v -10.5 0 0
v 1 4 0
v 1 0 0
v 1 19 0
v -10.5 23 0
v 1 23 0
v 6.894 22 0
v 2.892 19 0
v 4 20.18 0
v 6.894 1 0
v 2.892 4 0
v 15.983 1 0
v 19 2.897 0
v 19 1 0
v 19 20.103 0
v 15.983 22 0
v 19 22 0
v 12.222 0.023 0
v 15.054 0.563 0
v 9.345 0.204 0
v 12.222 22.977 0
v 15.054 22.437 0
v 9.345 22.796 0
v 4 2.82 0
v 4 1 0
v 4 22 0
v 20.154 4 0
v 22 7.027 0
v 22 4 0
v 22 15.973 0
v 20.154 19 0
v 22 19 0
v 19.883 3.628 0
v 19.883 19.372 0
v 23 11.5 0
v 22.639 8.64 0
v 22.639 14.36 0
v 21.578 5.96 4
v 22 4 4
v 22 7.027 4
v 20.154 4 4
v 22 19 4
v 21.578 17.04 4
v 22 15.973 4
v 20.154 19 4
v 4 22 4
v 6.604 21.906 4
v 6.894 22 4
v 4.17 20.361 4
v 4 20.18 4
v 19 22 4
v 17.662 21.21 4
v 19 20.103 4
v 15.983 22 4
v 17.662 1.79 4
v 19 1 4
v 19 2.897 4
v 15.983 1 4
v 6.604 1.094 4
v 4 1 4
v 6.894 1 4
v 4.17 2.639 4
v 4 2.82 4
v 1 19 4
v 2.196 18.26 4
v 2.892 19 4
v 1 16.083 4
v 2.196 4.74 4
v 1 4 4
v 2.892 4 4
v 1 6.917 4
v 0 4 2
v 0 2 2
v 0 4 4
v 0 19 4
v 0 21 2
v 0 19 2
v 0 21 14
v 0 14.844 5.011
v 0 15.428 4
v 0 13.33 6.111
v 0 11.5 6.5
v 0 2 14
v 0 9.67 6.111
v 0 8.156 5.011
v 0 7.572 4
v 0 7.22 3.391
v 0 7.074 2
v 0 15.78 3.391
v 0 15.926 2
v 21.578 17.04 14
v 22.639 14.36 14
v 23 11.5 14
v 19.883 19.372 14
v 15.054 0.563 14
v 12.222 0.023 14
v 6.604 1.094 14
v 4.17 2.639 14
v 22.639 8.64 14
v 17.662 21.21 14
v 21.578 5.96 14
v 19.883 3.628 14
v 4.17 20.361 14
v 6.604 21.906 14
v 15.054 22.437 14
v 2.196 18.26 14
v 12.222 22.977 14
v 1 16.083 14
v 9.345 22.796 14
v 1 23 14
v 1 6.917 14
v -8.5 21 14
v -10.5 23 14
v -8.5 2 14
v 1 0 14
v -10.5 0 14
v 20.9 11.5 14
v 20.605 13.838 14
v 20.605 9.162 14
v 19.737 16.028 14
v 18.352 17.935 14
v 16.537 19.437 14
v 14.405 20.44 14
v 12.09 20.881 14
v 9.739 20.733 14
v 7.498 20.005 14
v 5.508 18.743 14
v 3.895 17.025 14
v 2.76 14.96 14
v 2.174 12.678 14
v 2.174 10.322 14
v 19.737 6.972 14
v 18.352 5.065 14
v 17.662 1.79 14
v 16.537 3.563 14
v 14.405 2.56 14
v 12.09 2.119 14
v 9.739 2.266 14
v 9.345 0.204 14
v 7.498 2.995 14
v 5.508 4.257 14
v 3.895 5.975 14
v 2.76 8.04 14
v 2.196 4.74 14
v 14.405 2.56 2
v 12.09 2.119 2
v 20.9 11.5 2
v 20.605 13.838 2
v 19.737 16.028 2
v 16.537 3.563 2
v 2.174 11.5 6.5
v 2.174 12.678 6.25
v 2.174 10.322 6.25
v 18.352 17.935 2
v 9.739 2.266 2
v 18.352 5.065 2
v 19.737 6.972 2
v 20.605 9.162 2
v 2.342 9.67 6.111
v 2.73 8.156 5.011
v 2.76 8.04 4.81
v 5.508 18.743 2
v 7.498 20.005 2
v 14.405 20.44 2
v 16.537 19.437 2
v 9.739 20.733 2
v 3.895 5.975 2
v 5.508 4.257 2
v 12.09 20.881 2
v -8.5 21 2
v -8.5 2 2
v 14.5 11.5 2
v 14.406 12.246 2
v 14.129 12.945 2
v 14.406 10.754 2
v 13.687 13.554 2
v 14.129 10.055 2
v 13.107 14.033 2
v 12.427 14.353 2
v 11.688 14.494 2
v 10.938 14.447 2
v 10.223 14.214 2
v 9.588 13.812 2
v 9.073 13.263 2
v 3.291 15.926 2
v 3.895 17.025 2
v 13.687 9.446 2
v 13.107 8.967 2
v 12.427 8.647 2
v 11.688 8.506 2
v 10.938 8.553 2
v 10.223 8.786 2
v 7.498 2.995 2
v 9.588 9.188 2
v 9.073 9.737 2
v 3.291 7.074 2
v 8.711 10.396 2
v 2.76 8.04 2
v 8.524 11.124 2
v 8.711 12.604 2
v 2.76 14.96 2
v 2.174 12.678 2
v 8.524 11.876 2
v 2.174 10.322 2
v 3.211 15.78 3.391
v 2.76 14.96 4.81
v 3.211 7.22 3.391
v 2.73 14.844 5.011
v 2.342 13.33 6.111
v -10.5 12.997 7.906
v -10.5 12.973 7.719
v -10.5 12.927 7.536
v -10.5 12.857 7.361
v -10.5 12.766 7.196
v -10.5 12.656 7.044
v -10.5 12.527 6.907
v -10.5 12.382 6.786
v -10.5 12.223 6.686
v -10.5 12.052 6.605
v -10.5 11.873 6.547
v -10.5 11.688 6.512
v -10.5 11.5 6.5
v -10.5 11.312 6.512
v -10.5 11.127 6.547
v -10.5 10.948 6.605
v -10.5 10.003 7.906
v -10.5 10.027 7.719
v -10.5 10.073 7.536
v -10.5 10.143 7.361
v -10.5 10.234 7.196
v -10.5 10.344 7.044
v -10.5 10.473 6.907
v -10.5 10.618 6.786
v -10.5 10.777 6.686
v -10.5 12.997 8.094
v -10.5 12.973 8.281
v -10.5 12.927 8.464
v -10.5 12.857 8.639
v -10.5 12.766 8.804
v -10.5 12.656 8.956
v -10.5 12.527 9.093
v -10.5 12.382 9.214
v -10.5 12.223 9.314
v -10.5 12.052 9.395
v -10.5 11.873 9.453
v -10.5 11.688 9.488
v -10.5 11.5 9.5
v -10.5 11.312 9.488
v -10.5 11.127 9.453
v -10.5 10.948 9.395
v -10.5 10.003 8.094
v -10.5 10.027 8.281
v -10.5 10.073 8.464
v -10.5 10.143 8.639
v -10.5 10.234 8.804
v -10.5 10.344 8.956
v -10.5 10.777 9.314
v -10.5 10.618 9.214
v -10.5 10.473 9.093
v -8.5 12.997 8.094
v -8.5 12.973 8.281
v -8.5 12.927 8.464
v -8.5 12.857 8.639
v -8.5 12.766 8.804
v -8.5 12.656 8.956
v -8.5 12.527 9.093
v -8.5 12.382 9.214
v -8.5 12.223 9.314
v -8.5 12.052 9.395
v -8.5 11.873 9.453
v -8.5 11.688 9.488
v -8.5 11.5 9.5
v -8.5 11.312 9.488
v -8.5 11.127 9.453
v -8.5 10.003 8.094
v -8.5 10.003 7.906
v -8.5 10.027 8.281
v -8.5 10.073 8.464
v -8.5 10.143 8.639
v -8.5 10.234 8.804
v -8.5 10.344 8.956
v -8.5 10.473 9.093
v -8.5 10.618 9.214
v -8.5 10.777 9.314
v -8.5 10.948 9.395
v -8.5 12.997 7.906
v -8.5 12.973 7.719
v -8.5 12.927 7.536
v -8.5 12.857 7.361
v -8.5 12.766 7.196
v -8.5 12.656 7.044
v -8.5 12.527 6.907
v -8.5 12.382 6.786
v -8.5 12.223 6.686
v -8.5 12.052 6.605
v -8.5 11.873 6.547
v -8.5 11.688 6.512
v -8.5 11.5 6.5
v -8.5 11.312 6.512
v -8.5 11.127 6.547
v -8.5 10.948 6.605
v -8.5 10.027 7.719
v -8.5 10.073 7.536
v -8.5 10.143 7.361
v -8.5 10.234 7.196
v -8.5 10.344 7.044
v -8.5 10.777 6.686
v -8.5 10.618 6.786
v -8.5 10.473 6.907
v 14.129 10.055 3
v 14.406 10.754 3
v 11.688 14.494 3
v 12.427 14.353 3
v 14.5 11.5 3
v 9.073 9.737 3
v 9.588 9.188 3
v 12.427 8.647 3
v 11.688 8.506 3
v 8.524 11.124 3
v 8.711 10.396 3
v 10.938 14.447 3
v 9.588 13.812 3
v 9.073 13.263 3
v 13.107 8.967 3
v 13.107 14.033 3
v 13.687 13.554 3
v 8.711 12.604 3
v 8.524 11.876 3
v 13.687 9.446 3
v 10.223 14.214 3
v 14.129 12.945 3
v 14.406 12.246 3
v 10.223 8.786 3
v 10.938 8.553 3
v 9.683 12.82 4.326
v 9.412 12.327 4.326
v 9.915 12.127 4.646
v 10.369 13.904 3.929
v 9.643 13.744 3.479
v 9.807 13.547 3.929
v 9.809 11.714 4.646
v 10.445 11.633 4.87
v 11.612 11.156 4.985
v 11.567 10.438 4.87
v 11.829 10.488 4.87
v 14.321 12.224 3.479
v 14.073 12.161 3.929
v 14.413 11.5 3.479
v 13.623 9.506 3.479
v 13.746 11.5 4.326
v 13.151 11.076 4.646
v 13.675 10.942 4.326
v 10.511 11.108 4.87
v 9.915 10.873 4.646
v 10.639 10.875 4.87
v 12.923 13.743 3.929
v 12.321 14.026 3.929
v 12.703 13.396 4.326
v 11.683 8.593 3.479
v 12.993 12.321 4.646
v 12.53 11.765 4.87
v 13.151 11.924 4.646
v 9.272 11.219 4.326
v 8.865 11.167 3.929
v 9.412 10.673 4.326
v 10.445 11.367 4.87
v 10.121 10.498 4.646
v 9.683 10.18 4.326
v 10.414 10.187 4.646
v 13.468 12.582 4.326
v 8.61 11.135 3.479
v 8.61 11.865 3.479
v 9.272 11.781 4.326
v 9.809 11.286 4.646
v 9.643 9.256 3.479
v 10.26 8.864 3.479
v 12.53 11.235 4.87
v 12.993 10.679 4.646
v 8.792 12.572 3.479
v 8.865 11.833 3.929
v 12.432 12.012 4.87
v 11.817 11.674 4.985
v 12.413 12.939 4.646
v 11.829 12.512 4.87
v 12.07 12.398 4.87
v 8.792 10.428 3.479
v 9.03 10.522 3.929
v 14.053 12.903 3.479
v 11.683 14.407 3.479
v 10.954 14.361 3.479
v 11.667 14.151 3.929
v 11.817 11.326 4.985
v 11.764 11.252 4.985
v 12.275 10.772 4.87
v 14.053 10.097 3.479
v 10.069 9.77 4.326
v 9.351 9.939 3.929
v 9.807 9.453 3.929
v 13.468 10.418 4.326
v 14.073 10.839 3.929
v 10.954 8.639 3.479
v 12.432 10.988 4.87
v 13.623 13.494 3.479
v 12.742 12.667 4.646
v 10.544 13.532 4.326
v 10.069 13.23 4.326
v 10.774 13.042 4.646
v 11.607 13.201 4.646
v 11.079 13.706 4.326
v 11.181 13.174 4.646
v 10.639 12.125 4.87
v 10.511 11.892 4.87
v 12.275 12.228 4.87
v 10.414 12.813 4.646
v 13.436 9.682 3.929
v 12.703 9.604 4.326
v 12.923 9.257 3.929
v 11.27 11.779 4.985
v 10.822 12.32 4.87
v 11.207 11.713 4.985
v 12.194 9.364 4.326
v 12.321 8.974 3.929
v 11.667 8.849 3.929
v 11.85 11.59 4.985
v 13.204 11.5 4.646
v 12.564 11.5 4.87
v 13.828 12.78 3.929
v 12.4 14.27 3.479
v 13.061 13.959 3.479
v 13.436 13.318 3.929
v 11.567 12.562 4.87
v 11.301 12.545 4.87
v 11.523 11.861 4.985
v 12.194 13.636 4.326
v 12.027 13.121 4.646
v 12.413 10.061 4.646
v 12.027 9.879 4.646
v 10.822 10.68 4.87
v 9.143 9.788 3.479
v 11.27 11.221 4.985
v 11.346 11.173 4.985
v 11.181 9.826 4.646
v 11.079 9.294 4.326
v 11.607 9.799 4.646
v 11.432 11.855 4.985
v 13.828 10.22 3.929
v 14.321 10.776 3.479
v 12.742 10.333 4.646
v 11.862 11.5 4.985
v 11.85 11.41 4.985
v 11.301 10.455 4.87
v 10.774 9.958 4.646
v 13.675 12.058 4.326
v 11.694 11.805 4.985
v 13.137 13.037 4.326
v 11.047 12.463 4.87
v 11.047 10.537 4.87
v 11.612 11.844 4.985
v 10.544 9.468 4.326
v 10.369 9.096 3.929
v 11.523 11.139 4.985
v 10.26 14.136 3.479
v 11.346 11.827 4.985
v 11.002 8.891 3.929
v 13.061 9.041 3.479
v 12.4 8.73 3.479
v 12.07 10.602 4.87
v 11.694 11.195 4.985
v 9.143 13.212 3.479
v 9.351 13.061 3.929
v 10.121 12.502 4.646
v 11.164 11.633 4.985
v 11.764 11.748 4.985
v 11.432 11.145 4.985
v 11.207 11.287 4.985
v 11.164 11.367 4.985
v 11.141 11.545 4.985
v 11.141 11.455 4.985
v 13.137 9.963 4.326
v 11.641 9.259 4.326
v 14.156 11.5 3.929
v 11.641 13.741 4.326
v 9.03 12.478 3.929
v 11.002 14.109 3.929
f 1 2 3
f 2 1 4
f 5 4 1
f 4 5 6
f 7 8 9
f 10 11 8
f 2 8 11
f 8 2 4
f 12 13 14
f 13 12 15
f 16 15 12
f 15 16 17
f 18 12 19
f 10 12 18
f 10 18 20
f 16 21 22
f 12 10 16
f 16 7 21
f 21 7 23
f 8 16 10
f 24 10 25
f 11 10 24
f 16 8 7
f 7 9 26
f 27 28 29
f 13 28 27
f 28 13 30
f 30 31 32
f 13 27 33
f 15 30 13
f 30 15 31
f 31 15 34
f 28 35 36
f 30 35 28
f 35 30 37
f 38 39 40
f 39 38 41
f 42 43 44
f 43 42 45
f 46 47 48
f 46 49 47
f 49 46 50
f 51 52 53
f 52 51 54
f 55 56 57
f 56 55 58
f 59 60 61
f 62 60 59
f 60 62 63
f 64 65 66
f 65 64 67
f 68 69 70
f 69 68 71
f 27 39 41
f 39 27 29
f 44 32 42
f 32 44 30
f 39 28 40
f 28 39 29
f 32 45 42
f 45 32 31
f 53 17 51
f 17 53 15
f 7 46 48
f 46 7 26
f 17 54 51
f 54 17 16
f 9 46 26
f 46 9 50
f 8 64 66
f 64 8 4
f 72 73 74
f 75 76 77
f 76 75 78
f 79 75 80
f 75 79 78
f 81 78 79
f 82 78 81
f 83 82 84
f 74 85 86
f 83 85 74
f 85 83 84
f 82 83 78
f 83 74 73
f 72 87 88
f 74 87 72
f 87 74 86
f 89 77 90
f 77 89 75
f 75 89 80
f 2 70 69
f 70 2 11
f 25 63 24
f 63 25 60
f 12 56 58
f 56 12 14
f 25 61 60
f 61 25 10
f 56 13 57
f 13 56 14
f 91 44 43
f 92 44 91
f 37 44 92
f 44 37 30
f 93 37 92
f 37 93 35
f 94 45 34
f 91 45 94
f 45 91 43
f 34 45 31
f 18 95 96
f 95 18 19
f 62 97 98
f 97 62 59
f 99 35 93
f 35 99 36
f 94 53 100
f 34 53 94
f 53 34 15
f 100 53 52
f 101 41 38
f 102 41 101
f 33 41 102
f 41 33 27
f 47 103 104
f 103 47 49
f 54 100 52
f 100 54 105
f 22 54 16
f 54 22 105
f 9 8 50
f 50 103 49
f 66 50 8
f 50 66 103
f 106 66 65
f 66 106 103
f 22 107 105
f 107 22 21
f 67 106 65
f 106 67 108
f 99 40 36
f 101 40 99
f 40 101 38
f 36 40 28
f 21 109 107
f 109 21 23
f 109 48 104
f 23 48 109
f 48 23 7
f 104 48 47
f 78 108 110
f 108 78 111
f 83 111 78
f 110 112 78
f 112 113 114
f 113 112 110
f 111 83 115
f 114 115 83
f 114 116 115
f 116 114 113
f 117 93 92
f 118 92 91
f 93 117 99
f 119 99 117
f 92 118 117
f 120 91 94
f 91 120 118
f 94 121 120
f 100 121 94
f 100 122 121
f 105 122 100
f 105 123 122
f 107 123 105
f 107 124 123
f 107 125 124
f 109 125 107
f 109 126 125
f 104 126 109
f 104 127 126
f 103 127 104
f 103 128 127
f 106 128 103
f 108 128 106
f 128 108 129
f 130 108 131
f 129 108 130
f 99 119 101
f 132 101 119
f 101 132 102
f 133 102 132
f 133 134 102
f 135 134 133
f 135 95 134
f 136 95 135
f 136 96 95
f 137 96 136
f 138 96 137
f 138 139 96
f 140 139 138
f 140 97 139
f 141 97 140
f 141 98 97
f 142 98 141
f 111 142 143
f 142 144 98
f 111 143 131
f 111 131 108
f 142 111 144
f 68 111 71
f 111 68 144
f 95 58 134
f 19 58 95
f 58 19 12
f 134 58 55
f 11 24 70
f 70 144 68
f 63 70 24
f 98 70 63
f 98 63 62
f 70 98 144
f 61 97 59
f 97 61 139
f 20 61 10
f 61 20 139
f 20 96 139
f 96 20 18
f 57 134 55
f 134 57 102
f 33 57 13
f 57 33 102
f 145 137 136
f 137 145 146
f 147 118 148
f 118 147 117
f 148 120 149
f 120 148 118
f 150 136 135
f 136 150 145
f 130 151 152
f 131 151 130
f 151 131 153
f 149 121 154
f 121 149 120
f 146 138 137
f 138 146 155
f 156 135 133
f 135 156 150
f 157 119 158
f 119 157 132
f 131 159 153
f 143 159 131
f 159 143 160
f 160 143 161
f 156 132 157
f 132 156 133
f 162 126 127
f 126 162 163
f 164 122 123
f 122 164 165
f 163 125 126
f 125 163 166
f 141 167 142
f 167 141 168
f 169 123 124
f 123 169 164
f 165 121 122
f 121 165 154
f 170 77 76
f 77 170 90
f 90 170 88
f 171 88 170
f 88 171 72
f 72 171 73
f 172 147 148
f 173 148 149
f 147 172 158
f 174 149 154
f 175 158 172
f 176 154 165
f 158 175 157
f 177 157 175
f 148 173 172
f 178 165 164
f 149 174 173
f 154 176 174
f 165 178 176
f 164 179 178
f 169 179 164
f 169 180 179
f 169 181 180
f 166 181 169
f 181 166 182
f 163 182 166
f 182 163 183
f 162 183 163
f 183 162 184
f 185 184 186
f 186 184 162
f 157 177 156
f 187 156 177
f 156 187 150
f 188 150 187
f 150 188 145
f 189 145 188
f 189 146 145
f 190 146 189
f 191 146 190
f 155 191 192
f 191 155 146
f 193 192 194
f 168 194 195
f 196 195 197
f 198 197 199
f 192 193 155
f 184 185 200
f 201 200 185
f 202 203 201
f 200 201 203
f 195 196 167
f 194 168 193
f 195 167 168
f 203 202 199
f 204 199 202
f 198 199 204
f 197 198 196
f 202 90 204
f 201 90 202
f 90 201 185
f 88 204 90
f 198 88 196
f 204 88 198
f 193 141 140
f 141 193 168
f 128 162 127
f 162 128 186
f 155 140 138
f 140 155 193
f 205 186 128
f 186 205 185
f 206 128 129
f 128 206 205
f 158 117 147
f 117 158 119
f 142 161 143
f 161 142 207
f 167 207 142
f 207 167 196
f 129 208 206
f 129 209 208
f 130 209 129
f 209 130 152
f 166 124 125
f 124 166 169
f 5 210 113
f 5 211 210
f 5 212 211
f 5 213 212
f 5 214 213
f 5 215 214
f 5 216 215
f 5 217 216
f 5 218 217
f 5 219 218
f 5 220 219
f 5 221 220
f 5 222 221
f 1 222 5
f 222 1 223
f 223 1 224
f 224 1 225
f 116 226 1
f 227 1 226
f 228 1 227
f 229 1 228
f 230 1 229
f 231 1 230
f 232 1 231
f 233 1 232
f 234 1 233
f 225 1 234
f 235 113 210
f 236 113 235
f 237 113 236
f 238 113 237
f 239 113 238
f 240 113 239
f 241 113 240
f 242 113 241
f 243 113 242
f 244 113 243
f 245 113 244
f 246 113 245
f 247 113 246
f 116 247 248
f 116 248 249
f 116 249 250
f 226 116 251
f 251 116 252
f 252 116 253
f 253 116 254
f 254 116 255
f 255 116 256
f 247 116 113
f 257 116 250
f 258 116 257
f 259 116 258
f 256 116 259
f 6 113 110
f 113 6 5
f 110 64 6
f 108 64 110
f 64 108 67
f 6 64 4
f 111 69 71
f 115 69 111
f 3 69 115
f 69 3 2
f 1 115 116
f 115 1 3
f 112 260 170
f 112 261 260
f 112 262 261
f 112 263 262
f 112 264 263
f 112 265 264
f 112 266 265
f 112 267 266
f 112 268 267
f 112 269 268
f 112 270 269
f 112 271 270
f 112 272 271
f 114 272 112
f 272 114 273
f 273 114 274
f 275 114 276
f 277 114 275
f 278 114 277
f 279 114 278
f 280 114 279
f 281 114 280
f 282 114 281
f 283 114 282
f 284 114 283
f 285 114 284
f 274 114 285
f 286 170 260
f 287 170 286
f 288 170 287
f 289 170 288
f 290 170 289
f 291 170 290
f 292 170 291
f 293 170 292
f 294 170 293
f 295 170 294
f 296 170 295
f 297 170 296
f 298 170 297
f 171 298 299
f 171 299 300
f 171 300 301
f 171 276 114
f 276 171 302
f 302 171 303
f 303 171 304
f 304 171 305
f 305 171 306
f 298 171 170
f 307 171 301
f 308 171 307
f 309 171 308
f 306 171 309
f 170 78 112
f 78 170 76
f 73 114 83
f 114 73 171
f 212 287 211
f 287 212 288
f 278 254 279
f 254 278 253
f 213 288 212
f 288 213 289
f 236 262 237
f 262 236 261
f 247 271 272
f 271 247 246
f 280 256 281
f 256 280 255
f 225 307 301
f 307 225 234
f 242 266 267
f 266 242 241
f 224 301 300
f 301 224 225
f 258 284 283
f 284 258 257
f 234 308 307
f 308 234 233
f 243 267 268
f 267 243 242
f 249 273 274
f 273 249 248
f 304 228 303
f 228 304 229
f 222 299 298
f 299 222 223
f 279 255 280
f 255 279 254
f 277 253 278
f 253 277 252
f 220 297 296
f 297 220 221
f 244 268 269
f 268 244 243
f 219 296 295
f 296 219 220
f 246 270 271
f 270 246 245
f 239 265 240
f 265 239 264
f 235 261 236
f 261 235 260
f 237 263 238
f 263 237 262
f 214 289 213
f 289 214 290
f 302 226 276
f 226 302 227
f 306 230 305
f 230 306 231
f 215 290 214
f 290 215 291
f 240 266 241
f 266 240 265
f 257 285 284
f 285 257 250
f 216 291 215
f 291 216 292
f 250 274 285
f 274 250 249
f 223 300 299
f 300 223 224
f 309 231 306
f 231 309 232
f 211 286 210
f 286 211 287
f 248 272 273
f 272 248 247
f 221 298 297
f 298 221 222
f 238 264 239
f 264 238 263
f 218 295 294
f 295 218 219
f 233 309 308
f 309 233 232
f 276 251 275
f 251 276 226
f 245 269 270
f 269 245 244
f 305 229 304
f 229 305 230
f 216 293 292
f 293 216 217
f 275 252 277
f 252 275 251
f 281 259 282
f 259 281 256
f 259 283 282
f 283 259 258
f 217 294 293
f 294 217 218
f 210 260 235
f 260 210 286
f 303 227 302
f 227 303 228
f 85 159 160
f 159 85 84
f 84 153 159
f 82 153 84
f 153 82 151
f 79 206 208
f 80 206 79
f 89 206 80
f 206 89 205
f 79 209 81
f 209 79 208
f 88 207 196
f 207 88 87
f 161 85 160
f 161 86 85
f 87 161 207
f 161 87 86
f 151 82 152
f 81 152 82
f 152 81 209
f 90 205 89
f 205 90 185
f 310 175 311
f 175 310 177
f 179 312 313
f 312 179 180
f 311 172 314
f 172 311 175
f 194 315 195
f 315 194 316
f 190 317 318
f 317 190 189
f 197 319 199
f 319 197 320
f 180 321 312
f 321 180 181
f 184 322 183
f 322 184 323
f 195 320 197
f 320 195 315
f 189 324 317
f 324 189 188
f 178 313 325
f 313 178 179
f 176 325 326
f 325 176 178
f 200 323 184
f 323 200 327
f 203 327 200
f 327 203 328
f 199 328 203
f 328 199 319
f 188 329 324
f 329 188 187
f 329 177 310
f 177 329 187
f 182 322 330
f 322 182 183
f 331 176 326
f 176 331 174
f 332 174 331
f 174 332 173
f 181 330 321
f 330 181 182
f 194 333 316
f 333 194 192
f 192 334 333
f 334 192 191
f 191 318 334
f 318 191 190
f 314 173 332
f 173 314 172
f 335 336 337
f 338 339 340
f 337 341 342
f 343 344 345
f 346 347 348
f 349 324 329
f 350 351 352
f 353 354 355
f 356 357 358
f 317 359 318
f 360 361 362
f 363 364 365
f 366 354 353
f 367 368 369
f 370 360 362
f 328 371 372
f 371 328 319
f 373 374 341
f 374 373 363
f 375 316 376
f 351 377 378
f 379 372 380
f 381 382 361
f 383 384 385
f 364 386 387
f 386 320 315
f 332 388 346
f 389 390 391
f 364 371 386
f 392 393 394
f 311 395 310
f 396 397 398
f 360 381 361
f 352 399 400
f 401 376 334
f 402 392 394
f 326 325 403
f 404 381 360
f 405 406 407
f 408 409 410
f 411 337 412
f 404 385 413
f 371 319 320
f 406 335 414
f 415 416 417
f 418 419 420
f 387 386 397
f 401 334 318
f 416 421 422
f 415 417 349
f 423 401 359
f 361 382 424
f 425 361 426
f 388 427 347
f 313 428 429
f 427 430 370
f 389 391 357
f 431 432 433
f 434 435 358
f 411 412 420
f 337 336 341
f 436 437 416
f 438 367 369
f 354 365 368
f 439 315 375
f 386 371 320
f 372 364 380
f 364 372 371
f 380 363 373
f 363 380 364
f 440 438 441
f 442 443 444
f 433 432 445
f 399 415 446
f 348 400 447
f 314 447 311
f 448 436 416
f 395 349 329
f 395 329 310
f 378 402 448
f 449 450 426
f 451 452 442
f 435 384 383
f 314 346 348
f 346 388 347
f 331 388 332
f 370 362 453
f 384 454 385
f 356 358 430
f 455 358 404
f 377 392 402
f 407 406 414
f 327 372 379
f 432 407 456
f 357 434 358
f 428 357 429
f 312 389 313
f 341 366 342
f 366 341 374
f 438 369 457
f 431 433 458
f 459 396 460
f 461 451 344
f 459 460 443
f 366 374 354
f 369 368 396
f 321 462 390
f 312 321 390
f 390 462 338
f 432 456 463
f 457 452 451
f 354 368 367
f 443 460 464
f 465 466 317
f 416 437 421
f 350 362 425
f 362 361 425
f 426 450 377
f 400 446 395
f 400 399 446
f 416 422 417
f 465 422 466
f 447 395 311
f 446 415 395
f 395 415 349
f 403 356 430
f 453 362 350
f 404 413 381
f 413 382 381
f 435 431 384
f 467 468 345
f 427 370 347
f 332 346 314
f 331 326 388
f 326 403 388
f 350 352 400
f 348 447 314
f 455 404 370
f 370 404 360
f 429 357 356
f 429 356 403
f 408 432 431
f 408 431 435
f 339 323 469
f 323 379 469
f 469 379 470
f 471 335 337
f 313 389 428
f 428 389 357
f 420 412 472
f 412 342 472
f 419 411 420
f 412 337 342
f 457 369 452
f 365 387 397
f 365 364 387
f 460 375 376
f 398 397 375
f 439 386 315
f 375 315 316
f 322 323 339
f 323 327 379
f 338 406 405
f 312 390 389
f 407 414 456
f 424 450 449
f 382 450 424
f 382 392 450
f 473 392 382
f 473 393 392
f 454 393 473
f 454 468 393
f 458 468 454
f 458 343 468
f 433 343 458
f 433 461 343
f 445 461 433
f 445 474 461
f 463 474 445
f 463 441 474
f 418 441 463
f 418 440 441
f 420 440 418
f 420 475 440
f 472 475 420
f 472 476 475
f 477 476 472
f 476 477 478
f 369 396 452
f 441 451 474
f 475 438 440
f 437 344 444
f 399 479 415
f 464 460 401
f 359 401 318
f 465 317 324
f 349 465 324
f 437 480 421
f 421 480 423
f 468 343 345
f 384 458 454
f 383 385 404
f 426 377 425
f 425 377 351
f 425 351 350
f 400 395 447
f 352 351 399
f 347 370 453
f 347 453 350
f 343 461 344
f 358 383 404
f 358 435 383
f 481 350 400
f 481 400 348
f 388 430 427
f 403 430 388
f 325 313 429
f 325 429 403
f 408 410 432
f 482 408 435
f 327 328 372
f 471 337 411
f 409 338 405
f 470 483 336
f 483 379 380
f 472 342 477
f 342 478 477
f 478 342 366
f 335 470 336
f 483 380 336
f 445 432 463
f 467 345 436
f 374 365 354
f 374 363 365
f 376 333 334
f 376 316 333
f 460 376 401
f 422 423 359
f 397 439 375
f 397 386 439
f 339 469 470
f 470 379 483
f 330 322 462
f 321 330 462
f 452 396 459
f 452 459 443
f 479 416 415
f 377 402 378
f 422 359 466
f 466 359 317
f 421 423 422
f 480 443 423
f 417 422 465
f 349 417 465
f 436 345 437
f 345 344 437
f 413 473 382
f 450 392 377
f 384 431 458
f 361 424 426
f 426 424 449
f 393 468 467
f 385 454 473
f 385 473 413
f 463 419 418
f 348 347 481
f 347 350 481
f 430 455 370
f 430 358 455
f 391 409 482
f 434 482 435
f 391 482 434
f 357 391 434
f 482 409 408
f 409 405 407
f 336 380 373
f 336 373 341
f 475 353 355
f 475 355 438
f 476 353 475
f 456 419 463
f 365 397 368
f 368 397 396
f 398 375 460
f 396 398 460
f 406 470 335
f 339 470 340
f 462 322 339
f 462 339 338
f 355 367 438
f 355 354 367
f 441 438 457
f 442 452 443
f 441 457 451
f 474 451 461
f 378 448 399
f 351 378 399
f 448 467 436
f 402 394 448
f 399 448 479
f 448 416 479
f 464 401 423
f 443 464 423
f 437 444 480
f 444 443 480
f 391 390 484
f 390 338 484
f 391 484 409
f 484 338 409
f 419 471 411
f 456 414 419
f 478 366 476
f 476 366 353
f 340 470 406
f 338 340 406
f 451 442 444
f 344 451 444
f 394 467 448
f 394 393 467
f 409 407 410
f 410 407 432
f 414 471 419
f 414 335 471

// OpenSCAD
// Configurables
pack_size = 1;
 
// Constants
wall_thickness = 2;
inner_radius = 9.4;
support_height = 12;
track_width = 9;
dimple_stool = 1;
dimple_radius = 3;
buckle = 4;
gutter = 0.5;
double_gutter = gutter * 2;

// Calculations
outer_radius = 9.5 + (wall_thickness);
outer_diameter = outer_radius * 2;
inner_diameter = inner_radius * 2;
track_centering = (outer_diameter + wall_thickness - track_width)/2;
plate_height = wall_thickness * 2;
plate_size = (outer_diameter * pack_size) - pack_size;

module base_plate() {
  linear_extrude (height = plate_height) {
    difference() {
      translate([0,1,0]) square(size = [plate_size, outer_diameter - wall_thickness]);
       for(i=[1:pack_size-1]) {
         translate([i*outer_diameter-buckle,0,0]) square(size = [buckle*2,buckle]);
         translate([i*outer_diameter-buckle,outer_diameter-buckle,0]) square(size = [buckle*2,buckle]);
      }
    }
  }
}

module exterior_wall() {
  for(i=[0:pack_size-1]) {
    xmove = (i*(outer_diameter)) +outer_radius - (1*i);
    translate([xmove,outer_radius,0]) cylinder(r=outer_radius, h= support_height + wall_thickness, $fn=25);
  }
}

module wiring_slot() {
  translate([-4,track_centering+(track_width/2) -1,wall_thickness*2-wall_thickness]) union() {
    length = ((outer_diameter)*(pack_size))-wall_thickness-5;
    centering = -track_width/2;
    
    difference() {
      rotate([0,-90,180]) cylinder(r=track_width/2,h=length);
      translate([-gutter,centering-gutter,centering]) linear_extrude (height = track_width/2) {
        square(size = [length + 2, track_width +2 ]);
      }
    }
  }
}

module battery_well() {
  for(i=[0:pack_size-1]) {
    xmove = (i*(outer_diameter)) +outer_radius - (1*i);
    translate([xmove,outer_radius,wall_thickness]) cylinder(r=inner_radius, h= support_height +1,$fn=25);
  }
}

module battery_dimple() {
  for(i=[0:pack_size-1]) {
        xmove = (i*(outer_diameter)) +outer_radius - (1*i);
        translate([xmove,outer_radius,0]) union() {
            stool = dimple_stool + wall_thickness;
            linear_extrude (height = stool) circle(r = dimple_radius, $fn=25);
            translate([0,0,stool])scale([dimple_radius,dimple_radius,2]) sphere(r = 1, $fn=25);
        }
    }
}

module nut_catch() {
  translate([-outer_diameter/2 + 1,0,0]) difference() { 
    linear_extrude(height = support_height + wall_thickness) square(size = [outer_diameter/2, outer_diameter]);

   // Nut Catch 
    translate([2,2,2]) linear_extrude(height = support_height + wall_thickness+gutter  ) square(size = [ outer_diameter/2 - (wall_thickness*2) + 1, outer_diameter - (wall_thickness*2)]);
    
    // Screw Hole
    translate([gutter+3,outer_radius,(support_height+wall_thickness)/2 + 1]) rotate([0,-90]) cylinder(r=1.5, h = wall_thickness*4 + double_gutter , $fn=50);
    //translate([4,-1,0]) wiring_slot();
    
  } 
}

union() {
   difference() {
    union() {
        difference() {
            union() {
                base_plate();
                exterior_wall();
            }
            battery_well();
        }
        nut_catch();
    }
    wiring_slot();  
}

  battery_dimple(); 
}
